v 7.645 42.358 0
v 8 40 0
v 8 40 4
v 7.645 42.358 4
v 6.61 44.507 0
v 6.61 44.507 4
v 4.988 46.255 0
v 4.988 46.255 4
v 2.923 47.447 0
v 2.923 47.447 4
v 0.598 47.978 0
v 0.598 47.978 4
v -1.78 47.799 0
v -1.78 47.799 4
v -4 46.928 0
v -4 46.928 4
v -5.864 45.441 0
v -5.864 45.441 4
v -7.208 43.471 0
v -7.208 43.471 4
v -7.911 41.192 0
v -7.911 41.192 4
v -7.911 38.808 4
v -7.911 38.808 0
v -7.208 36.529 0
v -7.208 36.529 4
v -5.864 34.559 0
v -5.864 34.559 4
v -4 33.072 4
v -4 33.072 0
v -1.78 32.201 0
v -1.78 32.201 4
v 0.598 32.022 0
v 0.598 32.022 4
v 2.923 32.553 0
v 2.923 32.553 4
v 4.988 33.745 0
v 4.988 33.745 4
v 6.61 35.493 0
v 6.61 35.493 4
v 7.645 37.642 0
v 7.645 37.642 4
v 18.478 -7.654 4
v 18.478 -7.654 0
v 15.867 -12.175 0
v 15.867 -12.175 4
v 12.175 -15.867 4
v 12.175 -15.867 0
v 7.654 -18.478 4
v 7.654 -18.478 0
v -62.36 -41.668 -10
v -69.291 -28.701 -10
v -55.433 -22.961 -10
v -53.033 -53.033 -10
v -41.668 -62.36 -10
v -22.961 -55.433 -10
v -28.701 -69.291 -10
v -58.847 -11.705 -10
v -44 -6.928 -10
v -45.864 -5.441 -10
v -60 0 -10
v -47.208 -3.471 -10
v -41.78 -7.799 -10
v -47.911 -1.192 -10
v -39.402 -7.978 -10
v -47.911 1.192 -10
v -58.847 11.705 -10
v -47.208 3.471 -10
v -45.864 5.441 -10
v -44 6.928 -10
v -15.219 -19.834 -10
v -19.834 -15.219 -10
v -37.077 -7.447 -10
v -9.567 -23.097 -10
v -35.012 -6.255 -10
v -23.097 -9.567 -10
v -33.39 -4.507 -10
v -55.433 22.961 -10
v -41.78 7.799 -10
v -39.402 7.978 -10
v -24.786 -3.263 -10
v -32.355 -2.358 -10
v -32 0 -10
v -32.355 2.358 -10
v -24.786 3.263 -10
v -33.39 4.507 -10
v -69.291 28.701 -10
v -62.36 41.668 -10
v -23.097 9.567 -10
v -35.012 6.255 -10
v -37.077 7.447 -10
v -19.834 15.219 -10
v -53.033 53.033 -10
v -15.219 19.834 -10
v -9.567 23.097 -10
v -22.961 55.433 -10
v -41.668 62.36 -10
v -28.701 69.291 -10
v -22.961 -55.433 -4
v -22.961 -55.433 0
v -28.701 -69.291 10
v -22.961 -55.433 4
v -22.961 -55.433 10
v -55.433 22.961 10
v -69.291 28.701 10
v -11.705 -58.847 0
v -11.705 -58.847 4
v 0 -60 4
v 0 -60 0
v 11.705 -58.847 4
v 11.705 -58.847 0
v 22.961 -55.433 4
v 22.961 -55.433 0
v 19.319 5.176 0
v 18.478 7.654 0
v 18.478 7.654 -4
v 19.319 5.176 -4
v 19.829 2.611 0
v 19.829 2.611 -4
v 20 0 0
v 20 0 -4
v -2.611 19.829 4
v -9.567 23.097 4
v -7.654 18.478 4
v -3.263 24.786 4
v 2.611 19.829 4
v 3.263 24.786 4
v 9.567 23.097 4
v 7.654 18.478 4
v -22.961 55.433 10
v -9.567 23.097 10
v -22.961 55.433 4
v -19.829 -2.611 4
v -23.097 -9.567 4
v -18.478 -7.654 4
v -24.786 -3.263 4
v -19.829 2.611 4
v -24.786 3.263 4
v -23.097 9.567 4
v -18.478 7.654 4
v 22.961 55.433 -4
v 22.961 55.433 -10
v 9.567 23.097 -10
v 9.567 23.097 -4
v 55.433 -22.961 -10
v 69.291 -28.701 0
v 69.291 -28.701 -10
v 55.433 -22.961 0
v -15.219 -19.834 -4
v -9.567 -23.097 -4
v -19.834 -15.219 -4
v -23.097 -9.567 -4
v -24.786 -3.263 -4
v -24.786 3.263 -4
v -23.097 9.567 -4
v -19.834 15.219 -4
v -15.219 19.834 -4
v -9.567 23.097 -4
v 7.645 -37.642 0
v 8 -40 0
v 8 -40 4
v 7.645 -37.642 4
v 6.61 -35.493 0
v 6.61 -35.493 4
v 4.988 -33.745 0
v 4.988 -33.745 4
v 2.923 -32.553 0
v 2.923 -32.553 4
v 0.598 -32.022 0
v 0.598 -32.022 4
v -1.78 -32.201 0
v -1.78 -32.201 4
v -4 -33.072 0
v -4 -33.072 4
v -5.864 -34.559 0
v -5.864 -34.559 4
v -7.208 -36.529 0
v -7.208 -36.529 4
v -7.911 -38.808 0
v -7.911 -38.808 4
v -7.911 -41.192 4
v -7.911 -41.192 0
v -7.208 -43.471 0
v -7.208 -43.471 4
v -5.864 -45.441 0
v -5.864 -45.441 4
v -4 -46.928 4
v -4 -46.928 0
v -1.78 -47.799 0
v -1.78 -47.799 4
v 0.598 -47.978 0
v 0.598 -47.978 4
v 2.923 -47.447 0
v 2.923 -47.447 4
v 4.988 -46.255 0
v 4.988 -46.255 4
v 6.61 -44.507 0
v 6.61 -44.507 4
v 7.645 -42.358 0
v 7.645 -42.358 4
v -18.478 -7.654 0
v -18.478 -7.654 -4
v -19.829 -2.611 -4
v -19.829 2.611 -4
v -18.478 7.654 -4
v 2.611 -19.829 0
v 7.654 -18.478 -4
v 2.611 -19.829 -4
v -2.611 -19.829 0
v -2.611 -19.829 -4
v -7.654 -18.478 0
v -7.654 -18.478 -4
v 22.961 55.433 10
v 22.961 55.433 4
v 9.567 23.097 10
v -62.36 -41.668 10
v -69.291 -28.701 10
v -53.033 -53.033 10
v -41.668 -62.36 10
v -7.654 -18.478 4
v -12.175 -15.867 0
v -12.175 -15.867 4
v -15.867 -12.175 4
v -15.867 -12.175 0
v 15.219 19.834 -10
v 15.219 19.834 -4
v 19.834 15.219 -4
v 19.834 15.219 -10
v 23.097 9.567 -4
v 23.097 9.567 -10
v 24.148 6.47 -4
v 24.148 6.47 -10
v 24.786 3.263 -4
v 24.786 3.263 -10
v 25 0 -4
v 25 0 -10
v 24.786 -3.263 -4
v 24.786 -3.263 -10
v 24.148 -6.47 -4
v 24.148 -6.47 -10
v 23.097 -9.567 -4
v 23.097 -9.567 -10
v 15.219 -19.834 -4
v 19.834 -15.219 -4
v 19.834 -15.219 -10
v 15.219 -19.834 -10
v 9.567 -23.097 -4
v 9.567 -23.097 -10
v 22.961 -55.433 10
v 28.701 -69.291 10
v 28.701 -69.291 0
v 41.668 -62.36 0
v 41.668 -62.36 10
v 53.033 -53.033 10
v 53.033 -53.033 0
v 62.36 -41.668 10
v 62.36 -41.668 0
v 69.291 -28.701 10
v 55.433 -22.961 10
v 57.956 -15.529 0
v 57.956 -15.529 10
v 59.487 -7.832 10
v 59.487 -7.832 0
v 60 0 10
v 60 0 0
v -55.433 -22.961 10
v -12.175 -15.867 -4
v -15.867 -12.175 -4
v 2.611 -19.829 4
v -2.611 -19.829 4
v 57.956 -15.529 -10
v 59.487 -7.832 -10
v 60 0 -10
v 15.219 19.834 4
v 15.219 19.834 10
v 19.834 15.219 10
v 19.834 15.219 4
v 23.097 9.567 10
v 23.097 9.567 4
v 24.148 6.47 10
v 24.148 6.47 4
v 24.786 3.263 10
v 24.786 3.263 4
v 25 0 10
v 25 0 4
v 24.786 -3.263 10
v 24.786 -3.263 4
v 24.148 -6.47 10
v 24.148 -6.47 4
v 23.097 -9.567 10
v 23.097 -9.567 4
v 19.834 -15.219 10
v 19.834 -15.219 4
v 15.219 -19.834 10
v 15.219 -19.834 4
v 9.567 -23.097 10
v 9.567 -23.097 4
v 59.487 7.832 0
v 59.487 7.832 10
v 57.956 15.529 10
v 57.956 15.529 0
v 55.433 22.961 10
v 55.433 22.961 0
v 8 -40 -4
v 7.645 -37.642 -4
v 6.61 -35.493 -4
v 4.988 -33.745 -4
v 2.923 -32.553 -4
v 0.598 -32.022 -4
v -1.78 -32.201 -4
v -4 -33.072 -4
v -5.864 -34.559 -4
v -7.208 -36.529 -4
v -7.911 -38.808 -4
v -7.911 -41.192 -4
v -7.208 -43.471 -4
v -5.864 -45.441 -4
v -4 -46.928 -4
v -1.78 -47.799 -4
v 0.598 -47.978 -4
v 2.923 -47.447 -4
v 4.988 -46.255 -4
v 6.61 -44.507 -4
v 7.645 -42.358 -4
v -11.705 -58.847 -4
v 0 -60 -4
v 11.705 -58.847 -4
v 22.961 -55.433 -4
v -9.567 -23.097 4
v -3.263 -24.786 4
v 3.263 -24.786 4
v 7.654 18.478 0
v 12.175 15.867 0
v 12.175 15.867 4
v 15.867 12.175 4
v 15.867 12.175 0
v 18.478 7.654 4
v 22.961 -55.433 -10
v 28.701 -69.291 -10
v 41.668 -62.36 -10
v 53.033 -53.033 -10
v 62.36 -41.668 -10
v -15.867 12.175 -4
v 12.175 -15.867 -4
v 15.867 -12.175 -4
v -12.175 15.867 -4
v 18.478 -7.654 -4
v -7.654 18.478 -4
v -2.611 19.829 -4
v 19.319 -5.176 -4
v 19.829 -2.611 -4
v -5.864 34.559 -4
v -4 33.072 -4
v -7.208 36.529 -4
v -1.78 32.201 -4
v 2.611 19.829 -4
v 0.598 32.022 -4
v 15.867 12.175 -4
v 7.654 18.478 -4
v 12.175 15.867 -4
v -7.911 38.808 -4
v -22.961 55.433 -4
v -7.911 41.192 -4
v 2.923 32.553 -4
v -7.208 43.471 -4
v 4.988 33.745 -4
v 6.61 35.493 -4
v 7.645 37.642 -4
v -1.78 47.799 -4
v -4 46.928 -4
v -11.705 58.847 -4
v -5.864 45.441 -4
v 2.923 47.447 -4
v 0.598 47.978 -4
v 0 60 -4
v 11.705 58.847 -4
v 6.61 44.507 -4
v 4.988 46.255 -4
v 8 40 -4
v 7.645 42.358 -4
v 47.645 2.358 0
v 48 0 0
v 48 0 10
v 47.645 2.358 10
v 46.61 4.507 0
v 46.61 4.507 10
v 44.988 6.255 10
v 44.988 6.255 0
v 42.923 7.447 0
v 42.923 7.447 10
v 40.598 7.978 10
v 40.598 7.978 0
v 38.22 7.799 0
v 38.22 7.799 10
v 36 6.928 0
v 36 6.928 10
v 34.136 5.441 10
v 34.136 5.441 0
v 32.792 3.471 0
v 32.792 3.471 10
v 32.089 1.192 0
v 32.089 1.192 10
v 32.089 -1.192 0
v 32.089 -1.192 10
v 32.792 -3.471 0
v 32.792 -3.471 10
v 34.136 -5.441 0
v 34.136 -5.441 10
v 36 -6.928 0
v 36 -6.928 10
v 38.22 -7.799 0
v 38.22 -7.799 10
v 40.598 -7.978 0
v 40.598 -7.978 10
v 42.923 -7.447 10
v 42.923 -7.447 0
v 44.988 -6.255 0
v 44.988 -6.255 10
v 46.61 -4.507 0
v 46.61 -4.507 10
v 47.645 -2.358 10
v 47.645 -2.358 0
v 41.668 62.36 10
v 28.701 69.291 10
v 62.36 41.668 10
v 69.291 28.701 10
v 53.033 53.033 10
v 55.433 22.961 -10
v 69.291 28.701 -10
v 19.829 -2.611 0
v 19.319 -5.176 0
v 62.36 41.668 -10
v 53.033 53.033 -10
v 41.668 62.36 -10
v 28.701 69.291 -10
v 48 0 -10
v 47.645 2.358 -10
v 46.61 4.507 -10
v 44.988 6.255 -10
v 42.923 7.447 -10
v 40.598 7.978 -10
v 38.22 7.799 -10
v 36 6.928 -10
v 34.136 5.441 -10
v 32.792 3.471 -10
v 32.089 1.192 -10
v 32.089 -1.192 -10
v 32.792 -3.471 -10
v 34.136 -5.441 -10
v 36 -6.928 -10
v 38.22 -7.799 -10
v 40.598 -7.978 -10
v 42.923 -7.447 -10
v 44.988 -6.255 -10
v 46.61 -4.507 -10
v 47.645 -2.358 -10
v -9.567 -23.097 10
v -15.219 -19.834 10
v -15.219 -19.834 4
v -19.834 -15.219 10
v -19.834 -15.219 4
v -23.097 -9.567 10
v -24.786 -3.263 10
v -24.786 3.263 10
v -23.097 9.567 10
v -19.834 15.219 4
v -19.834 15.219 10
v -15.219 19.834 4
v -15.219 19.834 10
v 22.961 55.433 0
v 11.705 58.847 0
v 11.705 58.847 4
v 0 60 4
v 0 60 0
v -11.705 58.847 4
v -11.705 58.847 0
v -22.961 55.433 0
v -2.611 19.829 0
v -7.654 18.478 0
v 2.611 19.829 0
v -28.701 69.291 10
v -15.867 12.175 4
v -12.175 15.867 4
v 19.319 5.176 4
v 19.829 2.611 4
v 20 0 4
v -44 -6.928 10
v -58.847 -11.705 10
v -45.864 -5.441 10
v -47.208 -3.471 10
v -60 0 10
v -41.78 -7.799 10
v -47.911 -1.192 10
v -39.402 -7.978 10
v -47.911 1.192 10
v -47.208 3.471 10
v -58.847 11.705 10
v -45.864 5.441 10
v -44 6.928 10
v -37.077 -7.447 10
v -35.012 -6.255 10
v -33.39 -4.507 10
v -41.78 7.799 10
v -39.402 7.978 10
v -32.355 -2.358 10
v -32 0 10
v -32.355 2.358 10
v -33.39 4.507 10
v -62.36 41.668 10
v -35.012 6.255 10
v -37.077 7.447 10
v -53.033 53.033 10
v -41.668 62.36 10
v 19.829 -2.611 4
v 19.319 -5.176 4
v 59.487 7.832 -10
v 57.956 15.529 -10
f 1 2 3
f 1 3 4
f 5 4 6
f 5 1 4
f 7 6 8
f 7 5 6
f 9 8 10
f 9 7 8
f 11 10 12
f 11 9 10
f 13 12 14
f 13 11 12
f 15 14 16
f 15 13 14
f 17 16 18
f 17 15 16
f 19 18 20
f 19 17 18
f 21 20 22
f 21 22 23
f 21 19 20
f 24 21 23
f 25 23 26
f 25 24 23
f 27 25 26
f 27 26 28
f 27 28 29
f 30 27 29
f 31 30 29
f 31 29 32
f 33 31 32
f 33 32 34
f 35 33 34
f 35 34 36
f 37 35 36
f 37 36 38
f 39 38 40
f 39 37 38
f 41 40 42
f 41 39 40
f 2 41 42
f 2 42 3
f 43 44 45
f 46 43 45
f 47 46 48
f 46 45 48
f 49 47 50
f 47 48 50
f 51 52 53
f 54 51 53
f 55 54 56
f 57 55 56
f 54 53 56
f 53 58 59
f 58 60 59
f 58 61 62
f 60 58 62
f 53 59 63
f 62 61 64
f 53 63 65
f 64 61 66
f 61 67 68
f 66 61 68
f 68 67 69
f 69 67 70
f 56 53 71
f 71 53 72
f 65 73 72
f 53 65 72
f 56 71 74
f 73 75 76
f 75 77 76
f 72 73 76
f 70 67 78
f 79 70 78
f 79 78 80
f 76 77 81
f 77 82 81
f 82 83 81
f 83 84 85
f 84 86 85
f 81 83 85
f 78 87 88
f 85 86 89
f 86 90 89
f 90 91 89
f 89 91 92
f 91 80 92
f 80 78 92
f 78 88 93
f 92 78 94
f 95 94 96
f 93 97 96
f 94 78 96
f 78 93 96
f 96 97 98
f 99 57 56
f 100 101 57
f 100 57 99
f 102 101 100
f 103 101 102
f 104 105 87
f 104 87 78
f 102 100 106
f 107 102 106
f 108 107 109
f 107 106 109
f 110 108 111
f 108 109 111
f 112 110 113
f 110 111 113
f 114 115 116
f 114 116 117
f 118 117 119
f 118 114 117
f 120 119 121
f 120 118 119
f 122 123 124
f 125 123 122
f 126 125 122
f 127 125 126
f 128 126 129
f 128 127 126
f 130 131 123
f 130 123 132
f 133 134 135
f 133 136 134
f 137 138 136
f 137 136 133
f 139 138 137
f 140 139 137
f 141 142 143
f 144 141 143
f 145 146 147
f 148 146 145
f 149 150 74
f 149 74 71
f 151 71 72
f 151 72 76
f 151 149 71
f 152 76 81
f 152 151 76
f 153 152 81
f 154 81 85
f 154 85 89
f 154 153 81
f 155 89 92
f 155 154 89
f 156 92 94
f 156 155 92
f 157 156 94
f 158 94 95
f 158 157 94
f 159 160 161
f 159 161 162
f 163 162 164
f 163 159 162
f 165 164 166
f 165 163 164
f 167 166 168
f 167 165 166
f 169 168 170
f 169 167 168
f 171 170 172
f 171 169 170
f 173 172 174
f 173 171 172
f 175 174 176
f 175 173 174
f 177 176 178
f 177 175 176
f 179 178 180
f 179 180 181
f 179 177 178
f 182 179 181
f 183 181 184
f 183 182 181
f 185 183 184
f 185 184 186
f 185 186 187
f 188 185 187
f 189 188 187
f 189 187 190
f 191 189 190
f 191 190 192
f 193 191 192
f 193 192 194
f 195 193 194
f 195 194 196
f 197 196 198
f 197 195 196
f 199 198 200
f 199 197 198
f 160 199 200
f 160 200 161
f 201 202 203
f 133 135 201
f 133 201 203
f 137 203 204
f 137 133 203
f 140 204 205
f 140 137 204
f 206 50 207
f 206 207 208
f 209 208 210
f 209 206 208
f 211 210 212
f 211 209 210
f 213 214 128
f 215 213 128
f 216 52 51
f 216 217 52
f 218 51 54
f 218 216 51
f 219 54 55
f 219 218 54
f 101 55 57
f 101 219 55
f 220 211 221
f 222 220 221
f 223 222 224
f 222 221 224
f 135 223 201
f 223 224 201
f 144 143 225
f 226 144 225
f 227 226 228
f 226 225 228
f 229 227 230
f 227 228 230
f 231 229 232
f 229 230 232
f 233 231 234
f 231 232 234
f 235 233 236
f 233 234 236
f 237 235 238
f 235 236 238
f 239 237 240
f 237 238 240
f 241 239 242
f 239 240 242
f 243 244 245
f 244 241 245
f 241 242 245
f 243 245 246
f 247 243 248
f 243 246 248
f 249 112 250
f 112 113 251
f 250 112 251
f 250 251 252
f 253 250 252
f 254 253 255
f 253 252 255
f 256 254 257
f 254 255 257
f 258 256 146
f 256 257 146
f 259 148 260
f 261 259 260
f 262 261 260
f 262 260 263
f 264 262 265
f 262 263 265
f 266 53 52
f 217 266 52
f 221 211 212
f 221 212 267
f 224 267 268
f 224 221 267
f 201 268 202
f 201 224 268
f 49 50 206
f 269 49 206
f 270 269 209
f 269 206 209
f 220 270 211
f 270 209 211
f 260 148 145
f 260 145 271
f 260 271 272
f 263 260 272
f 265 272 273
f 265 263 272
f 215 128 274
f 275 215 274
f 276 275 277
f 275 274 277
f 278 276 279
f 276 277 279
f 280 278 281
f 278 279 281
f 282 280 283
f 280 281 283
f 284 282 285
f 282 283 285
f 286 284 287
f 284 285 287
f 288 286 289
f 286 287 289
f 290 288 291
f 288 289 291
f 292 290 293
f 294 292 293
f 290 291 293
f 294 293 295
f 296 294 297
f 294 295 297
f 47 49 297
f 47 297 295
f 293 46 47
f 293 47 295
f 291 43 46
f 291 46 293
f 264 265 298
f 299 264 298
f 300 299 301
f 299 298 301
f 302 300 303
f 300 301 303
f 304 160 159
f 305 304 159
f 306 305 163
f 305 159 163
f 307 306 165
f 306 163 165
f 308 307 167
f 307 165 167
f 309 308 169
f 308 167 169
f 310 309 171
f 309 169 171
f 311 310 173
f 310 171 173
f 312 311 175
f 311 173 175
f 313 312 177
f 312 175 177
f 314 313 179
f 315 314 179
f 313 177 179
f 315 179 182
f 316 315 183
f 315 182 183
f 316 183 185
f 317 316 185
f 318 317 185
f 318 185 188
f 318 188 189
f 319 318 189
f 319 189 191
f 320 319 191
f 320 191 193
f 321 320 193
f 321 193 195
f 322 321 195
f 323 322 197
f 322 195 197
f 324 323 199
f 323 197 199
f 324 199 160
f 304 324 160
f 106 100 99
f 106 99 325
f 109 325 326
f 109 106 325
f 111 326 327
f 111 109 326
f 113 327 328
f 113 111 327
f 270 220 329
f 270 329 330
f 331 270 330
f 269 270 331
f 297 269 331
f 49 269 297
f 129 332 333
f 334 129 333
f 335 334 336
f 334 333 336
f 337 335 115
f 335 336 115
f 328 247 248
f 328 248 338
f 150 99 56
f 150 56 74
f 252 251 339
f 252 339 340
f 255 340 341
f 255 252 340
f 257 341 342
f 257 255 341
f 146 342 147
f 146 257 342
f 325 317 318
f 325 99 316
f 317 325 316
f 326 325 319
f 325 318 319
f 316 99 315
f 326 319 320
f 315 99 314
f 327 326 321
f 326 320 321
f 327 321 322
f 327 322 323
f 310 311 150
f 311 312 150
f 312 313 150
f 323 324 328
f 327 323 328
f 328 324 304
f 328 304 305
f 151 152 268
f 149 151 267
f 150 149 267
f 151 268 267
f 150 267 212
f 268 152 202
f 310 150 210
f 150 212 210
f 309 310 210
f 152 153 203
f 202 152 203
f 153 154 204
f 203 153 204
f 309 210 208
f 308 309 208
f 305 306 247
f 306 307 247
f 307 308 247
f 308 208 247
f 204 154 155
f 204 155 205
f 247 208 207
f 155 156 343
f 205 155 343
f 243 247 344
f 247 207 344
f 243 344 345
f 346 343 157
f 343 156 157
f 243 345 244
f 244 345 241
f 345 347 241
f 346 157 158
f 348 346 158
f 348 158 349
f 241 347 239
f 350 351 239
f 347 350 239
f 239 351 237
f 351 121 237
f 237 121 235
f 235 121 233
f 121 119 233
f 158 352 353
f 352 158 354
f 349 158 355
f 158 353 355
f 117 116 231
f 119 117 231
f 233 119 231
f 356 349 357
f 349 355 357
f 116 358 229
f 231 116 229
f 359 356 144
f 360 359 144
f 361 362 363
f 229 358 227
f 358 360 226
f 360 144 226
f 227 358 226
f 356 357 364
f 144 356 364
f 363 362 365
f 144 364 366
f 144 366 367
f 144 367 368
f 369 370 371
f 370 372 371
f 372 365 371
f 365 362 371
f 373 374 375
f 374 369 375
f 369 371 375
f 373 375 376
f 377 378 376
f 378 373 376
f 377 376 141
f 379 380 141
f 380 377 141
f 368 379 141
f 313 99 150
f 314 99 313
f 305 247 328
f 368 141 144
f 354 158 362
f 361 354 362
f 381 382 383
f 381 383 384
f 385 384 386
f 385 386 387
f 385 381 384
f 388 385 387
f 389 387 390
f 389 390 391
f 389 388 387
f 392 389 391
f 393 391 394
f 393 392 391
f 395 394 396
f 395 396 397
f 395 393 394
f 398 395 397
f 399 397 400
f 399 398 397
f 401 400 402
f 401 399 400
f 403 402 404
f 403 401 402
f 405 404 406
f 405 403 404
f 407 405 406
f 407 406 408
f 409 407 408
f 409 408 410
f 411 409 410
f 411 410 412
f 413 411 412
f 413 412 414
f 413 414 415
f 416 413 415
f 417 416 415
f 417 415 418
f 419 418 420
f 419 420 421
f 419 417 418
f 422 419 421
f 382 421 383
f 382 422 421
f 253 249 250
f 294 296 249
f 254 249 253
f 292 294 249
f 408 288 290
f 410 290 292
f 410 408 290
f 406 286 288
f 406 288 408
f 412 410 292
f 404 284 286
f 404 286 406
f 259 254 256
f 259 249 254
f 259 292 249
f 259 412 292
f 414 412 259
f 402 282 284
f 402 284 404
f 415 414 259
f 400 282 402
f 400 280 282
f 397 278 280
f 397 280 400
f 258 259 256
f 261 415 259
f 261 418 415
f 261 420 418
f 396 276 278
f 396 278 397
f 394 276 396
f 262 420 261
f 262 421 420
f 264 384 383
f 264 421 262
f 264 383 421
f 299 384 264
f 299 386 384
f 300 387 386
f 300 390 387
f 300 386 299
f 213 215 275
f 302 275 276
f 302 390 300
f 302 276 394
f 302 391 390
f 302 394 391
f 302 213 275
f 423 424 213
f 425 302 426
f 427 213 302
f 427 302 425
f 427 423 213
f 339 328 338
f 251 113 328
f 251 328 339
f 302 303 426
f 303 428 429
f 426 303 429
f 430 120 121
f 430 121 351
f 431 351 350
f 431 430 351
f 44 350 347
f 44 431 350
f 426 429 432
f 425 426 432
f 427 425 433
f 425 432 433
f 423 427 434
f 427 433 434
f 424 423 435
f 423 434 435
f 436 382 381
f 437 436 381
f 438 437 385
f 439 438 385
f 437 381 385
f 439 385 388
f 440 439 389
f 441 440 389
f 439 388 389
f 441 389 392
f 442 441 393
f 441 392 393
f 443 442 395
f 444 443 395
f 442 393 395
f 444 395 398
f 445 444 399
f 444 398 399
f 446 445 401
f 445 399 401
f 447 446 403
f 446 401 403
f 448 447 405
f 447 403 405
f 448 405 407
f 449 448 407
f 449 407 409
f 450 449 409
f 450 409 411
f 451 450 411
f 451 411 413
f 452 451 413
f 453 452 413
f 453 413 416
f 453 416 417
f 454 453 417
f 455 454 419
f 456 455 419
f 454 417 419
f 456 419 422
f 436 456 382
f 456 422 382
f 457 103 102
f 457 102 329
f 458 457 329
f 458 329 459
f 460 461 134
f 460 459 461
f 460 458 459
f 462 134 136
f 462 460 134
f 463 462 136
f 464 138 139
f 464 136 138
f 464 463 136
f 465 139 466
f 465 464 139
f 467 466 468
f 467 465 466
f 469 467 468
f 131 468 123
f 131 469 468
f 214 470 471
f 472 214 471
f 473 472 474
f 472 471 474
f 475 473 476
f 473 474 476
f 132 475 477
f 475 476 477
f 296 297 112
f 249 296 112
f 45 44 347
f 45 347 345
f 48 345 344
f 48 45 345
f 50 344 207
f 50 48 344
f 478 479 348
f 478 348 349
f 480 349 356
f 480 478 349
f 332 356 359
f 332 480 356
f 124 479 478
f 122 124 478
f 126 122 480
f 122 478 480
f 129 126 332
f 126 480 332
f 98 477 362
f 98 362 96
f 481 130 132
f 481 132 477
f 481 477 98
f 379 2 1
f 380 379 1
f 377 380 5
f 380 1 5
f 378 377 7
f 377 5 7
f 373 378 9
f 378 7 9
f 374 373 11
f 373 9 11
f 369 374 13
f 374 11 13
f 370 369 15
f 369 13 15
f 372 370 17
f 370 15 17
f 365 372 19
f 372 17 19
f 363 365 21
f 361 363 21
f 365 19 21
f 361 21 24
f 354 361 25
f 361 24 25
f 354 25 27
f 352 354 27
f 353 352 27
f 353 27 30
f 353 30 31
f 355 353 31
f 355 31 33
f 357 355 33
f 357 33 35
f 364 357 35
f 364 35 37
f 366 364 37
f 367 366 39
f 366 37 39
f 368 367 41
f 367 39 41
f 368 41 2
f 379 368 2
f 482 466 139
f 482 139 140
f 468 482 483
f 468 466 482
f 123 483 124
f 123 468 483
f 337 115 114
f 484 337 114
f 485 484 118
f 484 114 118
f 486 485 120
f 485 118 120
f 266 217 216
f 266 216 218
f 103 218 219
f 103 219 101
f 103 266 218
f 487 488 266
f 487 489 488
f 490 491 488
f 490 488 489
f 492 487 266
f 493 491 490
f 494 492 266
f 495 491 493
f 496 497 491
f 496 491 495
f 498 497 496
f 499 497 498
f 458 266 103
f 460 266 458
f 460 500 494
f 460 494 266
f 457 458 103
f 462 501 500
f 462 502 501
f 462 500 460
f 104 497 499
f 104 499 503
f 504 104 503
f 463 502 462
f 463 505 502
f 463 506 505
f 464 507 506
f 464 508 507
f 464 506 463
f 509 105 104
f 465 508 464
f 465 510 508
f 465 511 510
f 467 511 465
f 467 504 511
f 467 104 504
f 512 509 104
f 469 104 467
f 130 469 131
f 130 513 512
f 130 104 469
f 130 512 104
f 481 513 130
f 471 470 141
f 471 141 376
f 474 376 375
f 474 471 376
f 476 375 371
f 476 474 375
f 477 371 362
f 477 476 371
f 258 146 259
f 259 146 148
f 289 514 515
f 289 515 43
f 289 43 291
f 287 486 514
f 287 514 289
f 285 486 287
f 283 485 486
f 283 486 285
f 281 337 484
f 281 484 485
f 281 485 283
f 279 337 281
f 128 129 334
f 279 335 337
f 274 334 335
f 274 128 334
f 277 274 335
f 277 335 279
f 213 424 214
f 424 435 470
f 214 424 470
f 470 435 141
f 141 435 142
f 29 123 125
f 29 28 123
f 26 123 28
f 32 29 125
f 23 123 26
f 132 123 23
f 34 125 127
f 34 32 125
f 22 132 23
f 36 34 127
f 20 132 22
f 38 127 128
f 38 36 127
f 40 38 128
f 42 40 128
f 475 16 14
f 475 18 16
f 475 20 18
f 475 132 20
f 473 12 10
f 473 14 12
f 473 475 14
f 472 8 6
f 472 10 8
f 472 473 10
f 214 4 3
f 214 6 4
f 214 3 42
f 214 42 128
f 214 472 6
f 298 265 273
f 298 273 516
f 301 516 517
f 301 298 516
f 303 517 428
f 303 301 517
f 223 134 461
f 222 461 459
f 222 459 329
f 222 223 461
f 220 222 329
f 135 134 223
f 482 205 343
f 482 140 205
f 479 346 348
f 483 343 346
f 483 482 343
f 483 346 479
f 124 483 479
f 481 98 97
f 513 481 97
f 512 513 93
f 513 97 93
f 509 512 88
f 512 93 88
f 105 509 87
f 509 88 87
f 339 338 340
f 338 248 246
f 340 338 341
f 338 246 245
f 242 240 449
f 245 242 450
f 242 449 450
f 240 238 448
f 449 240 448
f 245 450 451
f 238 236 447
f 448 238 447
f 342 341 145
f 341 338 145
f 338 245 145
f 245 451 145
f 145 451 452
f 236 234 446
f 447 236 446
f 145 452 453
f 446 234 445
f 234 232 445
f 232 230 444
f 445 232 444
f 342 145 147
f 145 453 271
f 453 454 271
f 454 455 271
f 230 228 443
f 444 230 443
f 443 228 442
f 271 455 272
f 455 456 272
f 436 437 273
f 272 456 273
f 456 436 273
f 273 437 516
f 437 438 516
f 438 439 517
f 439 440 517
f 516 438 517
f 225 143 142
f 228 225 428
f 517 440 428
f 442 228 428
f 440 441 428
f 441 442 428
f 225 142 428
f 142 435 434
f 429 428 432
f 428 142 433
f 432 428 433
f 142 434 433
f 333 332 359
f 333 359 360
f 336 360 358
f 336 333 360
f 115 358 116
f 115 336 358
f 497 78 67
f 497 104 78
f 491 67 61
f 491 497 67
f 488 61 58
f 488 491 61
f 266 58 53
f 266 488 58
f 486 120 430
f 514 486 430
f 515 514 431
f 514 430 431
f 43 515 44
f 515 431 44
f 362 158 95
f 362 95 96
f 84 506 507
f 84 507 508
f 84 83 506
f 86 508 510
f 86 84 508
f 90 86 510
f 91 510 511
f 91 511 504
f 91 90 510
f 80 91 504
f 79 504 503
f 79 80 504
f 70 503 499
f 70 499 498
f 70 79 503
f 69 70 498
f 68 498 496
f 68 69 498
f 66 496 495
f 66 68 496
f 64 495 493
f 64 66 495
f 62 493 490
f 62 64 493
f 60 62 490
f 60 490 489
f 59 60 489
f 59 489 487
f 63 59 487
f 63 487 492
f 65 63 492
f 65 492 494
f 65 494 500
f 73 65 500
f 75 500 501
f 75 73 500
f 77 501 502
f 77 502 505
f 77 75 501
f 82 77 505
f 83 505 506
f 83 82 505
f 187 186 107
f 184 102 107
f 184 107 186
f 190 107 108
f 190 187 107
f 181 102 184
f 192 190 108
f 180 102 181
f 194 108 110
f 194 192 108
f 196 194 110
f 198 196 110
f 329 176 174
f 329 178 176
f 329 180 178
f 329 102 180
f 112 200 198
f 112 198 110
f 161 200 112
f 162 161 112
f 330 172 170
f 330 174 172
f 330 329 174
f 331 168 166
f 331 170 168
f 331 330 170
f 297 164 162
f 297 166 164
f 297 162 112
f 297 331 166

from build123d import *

# Parameters (mm, degrees)
SKETCH1_R             = 8
BOSS_EXTRUDE1_DEPTH   = 10
BOSS_EXTRUDE1_2_DEPTH = 10
SKETCH1_3_R           = 20
SKETCH1_3_R_2         = 8
BOSS_EXTRUDE2_DEPTH   = 4


with BuildPart() as part:
    # Sketch1 → Boss-Extrude1 (new, symmetric)
    with BuildSketch(Plane.XY):
        with BuildLine():
            ThreePointArc((9.567085809, 23.096988313), (25, 0), (9.567085809, -23.096988313))
            Line((9.567085809, -23.096988313), (28.701257427, -69.290964938))
            ThreePointArc((28.701257427, -69.290964938), (53.033008589, -53.033008589), (69.290964938, -28.701257427))
            Line((69.290964938, -28.701257427), (55.432771951, -22.961005942))
            ThreePointArc((55.432771951, -22.961005942), (60, 0), (55.432771951, 22.961005942))
            Line((55.432771951, 22.961005942), (69.290964938, 28.701257427))
            ThreePointArc((69.290964938, 28.701257427), (53.033008589, 53.033008589), (28.701257427, 69.290964938))
            Line((28.701257427, 69.290964938), (9.567085809, 23.096988313))
        make_face()
        with Locations((40, 0)):
            Circle(SKETCH1_R, mode=Mode.SUBTRACT)
    extrude(amount=BOSS_EXTRUDE1_DEPTH, both=True)



with BuildPart() as body_2:
    # Sketch1 → Boss-Extrude1 2 (new, symmetric)
    with BuildSketch(Plane.XY):
        with BuildLine():
            Line((-9.567085809, 23.096988313), (-28.701257427, 69.290964938))
            ThreePointArc((-28.701257427, 69.290964938), (-53.033008589, 53.033008589), (-69.290964938, 28.701257427))
            Line((-69.290964938, 28.701257427), (-55.432771951, 22.961005942))
            ThreePointArc((-55.432771951, 22.961005942), (-60, 0), (-55.432771951, -22.961005942))
            Line((-55.432771951, -22.961005942), (-69.290964938, -28.701257427))
            ThreePointArc((-69.290964938, -28.701257427), (-53.033008589, -53.033008589), (-28.701257427, -69.290964938))
            Line((-28.701257427, -69.290964938), (-9.567085809, -23.096988313))
            ThreePointArc((-9.567085809, -23.096988313), (-25, 0), (-9.567085809, 23.096988313))
        make_face()
        with Locations((-40, 0)):
            Circle(SKETCH1_R, mode=Mode.SUBTRACT)
    extrude(amount=BOSS_EXTRUDE1_2_DEPTH, both=True)


with BuildPart() as part_1:
    add(part.part)

    add(body_2.part)  # Boss-Extrude2 merges body 2
    # Sketch1<3> → Boss-Extrude2 (add, symmetric)
    with BuildSketch(Plane.XY):
        with BuildLine():
            ThreePointArc((-9.567085809, 23.096988313), (-25, 0), (-9.567085809, -23.096988313))
            Line((-9.567085809, -23.096988313), (-22.961005942, -55.432771951))
            ThreePointArc((-22.961005942, -55.432771951), (0, -60), (22.961005942, -55.432771951))
            Line((22.961005942, -55.432771951), (9.567085809, -23.096988313))
            ThreePointArc((9.567085809, -23.096988313), (25, 0), (9.567085809, 23.096988313))
            Line((9.567085809, 23.096988313), (22.961005942, 55.432771951))
            ThreePointArc((22.961005942, 55.432771951), (0, 60), (-22.961005942, 55.432771951))
            Line((-22.961005942, 55.432771951), (-9.567085809, 23.096988313))
        make_face()
        Circle(SKETCH1_3_R, mode=Mode.SUBTRACT)
        with Locations((0, 40)):
            Circle(SKETCH1_3_R_2, mode=Mode.SUBTRACT)
        with Locations((0, -40)):
            Circle(SKETCH1_3_R_2, mode=Mode.SUBTRACT)
    extrude(amount=BOSS_EXTRUDE2_DEPTH, both=True)


solid = part_1.part
